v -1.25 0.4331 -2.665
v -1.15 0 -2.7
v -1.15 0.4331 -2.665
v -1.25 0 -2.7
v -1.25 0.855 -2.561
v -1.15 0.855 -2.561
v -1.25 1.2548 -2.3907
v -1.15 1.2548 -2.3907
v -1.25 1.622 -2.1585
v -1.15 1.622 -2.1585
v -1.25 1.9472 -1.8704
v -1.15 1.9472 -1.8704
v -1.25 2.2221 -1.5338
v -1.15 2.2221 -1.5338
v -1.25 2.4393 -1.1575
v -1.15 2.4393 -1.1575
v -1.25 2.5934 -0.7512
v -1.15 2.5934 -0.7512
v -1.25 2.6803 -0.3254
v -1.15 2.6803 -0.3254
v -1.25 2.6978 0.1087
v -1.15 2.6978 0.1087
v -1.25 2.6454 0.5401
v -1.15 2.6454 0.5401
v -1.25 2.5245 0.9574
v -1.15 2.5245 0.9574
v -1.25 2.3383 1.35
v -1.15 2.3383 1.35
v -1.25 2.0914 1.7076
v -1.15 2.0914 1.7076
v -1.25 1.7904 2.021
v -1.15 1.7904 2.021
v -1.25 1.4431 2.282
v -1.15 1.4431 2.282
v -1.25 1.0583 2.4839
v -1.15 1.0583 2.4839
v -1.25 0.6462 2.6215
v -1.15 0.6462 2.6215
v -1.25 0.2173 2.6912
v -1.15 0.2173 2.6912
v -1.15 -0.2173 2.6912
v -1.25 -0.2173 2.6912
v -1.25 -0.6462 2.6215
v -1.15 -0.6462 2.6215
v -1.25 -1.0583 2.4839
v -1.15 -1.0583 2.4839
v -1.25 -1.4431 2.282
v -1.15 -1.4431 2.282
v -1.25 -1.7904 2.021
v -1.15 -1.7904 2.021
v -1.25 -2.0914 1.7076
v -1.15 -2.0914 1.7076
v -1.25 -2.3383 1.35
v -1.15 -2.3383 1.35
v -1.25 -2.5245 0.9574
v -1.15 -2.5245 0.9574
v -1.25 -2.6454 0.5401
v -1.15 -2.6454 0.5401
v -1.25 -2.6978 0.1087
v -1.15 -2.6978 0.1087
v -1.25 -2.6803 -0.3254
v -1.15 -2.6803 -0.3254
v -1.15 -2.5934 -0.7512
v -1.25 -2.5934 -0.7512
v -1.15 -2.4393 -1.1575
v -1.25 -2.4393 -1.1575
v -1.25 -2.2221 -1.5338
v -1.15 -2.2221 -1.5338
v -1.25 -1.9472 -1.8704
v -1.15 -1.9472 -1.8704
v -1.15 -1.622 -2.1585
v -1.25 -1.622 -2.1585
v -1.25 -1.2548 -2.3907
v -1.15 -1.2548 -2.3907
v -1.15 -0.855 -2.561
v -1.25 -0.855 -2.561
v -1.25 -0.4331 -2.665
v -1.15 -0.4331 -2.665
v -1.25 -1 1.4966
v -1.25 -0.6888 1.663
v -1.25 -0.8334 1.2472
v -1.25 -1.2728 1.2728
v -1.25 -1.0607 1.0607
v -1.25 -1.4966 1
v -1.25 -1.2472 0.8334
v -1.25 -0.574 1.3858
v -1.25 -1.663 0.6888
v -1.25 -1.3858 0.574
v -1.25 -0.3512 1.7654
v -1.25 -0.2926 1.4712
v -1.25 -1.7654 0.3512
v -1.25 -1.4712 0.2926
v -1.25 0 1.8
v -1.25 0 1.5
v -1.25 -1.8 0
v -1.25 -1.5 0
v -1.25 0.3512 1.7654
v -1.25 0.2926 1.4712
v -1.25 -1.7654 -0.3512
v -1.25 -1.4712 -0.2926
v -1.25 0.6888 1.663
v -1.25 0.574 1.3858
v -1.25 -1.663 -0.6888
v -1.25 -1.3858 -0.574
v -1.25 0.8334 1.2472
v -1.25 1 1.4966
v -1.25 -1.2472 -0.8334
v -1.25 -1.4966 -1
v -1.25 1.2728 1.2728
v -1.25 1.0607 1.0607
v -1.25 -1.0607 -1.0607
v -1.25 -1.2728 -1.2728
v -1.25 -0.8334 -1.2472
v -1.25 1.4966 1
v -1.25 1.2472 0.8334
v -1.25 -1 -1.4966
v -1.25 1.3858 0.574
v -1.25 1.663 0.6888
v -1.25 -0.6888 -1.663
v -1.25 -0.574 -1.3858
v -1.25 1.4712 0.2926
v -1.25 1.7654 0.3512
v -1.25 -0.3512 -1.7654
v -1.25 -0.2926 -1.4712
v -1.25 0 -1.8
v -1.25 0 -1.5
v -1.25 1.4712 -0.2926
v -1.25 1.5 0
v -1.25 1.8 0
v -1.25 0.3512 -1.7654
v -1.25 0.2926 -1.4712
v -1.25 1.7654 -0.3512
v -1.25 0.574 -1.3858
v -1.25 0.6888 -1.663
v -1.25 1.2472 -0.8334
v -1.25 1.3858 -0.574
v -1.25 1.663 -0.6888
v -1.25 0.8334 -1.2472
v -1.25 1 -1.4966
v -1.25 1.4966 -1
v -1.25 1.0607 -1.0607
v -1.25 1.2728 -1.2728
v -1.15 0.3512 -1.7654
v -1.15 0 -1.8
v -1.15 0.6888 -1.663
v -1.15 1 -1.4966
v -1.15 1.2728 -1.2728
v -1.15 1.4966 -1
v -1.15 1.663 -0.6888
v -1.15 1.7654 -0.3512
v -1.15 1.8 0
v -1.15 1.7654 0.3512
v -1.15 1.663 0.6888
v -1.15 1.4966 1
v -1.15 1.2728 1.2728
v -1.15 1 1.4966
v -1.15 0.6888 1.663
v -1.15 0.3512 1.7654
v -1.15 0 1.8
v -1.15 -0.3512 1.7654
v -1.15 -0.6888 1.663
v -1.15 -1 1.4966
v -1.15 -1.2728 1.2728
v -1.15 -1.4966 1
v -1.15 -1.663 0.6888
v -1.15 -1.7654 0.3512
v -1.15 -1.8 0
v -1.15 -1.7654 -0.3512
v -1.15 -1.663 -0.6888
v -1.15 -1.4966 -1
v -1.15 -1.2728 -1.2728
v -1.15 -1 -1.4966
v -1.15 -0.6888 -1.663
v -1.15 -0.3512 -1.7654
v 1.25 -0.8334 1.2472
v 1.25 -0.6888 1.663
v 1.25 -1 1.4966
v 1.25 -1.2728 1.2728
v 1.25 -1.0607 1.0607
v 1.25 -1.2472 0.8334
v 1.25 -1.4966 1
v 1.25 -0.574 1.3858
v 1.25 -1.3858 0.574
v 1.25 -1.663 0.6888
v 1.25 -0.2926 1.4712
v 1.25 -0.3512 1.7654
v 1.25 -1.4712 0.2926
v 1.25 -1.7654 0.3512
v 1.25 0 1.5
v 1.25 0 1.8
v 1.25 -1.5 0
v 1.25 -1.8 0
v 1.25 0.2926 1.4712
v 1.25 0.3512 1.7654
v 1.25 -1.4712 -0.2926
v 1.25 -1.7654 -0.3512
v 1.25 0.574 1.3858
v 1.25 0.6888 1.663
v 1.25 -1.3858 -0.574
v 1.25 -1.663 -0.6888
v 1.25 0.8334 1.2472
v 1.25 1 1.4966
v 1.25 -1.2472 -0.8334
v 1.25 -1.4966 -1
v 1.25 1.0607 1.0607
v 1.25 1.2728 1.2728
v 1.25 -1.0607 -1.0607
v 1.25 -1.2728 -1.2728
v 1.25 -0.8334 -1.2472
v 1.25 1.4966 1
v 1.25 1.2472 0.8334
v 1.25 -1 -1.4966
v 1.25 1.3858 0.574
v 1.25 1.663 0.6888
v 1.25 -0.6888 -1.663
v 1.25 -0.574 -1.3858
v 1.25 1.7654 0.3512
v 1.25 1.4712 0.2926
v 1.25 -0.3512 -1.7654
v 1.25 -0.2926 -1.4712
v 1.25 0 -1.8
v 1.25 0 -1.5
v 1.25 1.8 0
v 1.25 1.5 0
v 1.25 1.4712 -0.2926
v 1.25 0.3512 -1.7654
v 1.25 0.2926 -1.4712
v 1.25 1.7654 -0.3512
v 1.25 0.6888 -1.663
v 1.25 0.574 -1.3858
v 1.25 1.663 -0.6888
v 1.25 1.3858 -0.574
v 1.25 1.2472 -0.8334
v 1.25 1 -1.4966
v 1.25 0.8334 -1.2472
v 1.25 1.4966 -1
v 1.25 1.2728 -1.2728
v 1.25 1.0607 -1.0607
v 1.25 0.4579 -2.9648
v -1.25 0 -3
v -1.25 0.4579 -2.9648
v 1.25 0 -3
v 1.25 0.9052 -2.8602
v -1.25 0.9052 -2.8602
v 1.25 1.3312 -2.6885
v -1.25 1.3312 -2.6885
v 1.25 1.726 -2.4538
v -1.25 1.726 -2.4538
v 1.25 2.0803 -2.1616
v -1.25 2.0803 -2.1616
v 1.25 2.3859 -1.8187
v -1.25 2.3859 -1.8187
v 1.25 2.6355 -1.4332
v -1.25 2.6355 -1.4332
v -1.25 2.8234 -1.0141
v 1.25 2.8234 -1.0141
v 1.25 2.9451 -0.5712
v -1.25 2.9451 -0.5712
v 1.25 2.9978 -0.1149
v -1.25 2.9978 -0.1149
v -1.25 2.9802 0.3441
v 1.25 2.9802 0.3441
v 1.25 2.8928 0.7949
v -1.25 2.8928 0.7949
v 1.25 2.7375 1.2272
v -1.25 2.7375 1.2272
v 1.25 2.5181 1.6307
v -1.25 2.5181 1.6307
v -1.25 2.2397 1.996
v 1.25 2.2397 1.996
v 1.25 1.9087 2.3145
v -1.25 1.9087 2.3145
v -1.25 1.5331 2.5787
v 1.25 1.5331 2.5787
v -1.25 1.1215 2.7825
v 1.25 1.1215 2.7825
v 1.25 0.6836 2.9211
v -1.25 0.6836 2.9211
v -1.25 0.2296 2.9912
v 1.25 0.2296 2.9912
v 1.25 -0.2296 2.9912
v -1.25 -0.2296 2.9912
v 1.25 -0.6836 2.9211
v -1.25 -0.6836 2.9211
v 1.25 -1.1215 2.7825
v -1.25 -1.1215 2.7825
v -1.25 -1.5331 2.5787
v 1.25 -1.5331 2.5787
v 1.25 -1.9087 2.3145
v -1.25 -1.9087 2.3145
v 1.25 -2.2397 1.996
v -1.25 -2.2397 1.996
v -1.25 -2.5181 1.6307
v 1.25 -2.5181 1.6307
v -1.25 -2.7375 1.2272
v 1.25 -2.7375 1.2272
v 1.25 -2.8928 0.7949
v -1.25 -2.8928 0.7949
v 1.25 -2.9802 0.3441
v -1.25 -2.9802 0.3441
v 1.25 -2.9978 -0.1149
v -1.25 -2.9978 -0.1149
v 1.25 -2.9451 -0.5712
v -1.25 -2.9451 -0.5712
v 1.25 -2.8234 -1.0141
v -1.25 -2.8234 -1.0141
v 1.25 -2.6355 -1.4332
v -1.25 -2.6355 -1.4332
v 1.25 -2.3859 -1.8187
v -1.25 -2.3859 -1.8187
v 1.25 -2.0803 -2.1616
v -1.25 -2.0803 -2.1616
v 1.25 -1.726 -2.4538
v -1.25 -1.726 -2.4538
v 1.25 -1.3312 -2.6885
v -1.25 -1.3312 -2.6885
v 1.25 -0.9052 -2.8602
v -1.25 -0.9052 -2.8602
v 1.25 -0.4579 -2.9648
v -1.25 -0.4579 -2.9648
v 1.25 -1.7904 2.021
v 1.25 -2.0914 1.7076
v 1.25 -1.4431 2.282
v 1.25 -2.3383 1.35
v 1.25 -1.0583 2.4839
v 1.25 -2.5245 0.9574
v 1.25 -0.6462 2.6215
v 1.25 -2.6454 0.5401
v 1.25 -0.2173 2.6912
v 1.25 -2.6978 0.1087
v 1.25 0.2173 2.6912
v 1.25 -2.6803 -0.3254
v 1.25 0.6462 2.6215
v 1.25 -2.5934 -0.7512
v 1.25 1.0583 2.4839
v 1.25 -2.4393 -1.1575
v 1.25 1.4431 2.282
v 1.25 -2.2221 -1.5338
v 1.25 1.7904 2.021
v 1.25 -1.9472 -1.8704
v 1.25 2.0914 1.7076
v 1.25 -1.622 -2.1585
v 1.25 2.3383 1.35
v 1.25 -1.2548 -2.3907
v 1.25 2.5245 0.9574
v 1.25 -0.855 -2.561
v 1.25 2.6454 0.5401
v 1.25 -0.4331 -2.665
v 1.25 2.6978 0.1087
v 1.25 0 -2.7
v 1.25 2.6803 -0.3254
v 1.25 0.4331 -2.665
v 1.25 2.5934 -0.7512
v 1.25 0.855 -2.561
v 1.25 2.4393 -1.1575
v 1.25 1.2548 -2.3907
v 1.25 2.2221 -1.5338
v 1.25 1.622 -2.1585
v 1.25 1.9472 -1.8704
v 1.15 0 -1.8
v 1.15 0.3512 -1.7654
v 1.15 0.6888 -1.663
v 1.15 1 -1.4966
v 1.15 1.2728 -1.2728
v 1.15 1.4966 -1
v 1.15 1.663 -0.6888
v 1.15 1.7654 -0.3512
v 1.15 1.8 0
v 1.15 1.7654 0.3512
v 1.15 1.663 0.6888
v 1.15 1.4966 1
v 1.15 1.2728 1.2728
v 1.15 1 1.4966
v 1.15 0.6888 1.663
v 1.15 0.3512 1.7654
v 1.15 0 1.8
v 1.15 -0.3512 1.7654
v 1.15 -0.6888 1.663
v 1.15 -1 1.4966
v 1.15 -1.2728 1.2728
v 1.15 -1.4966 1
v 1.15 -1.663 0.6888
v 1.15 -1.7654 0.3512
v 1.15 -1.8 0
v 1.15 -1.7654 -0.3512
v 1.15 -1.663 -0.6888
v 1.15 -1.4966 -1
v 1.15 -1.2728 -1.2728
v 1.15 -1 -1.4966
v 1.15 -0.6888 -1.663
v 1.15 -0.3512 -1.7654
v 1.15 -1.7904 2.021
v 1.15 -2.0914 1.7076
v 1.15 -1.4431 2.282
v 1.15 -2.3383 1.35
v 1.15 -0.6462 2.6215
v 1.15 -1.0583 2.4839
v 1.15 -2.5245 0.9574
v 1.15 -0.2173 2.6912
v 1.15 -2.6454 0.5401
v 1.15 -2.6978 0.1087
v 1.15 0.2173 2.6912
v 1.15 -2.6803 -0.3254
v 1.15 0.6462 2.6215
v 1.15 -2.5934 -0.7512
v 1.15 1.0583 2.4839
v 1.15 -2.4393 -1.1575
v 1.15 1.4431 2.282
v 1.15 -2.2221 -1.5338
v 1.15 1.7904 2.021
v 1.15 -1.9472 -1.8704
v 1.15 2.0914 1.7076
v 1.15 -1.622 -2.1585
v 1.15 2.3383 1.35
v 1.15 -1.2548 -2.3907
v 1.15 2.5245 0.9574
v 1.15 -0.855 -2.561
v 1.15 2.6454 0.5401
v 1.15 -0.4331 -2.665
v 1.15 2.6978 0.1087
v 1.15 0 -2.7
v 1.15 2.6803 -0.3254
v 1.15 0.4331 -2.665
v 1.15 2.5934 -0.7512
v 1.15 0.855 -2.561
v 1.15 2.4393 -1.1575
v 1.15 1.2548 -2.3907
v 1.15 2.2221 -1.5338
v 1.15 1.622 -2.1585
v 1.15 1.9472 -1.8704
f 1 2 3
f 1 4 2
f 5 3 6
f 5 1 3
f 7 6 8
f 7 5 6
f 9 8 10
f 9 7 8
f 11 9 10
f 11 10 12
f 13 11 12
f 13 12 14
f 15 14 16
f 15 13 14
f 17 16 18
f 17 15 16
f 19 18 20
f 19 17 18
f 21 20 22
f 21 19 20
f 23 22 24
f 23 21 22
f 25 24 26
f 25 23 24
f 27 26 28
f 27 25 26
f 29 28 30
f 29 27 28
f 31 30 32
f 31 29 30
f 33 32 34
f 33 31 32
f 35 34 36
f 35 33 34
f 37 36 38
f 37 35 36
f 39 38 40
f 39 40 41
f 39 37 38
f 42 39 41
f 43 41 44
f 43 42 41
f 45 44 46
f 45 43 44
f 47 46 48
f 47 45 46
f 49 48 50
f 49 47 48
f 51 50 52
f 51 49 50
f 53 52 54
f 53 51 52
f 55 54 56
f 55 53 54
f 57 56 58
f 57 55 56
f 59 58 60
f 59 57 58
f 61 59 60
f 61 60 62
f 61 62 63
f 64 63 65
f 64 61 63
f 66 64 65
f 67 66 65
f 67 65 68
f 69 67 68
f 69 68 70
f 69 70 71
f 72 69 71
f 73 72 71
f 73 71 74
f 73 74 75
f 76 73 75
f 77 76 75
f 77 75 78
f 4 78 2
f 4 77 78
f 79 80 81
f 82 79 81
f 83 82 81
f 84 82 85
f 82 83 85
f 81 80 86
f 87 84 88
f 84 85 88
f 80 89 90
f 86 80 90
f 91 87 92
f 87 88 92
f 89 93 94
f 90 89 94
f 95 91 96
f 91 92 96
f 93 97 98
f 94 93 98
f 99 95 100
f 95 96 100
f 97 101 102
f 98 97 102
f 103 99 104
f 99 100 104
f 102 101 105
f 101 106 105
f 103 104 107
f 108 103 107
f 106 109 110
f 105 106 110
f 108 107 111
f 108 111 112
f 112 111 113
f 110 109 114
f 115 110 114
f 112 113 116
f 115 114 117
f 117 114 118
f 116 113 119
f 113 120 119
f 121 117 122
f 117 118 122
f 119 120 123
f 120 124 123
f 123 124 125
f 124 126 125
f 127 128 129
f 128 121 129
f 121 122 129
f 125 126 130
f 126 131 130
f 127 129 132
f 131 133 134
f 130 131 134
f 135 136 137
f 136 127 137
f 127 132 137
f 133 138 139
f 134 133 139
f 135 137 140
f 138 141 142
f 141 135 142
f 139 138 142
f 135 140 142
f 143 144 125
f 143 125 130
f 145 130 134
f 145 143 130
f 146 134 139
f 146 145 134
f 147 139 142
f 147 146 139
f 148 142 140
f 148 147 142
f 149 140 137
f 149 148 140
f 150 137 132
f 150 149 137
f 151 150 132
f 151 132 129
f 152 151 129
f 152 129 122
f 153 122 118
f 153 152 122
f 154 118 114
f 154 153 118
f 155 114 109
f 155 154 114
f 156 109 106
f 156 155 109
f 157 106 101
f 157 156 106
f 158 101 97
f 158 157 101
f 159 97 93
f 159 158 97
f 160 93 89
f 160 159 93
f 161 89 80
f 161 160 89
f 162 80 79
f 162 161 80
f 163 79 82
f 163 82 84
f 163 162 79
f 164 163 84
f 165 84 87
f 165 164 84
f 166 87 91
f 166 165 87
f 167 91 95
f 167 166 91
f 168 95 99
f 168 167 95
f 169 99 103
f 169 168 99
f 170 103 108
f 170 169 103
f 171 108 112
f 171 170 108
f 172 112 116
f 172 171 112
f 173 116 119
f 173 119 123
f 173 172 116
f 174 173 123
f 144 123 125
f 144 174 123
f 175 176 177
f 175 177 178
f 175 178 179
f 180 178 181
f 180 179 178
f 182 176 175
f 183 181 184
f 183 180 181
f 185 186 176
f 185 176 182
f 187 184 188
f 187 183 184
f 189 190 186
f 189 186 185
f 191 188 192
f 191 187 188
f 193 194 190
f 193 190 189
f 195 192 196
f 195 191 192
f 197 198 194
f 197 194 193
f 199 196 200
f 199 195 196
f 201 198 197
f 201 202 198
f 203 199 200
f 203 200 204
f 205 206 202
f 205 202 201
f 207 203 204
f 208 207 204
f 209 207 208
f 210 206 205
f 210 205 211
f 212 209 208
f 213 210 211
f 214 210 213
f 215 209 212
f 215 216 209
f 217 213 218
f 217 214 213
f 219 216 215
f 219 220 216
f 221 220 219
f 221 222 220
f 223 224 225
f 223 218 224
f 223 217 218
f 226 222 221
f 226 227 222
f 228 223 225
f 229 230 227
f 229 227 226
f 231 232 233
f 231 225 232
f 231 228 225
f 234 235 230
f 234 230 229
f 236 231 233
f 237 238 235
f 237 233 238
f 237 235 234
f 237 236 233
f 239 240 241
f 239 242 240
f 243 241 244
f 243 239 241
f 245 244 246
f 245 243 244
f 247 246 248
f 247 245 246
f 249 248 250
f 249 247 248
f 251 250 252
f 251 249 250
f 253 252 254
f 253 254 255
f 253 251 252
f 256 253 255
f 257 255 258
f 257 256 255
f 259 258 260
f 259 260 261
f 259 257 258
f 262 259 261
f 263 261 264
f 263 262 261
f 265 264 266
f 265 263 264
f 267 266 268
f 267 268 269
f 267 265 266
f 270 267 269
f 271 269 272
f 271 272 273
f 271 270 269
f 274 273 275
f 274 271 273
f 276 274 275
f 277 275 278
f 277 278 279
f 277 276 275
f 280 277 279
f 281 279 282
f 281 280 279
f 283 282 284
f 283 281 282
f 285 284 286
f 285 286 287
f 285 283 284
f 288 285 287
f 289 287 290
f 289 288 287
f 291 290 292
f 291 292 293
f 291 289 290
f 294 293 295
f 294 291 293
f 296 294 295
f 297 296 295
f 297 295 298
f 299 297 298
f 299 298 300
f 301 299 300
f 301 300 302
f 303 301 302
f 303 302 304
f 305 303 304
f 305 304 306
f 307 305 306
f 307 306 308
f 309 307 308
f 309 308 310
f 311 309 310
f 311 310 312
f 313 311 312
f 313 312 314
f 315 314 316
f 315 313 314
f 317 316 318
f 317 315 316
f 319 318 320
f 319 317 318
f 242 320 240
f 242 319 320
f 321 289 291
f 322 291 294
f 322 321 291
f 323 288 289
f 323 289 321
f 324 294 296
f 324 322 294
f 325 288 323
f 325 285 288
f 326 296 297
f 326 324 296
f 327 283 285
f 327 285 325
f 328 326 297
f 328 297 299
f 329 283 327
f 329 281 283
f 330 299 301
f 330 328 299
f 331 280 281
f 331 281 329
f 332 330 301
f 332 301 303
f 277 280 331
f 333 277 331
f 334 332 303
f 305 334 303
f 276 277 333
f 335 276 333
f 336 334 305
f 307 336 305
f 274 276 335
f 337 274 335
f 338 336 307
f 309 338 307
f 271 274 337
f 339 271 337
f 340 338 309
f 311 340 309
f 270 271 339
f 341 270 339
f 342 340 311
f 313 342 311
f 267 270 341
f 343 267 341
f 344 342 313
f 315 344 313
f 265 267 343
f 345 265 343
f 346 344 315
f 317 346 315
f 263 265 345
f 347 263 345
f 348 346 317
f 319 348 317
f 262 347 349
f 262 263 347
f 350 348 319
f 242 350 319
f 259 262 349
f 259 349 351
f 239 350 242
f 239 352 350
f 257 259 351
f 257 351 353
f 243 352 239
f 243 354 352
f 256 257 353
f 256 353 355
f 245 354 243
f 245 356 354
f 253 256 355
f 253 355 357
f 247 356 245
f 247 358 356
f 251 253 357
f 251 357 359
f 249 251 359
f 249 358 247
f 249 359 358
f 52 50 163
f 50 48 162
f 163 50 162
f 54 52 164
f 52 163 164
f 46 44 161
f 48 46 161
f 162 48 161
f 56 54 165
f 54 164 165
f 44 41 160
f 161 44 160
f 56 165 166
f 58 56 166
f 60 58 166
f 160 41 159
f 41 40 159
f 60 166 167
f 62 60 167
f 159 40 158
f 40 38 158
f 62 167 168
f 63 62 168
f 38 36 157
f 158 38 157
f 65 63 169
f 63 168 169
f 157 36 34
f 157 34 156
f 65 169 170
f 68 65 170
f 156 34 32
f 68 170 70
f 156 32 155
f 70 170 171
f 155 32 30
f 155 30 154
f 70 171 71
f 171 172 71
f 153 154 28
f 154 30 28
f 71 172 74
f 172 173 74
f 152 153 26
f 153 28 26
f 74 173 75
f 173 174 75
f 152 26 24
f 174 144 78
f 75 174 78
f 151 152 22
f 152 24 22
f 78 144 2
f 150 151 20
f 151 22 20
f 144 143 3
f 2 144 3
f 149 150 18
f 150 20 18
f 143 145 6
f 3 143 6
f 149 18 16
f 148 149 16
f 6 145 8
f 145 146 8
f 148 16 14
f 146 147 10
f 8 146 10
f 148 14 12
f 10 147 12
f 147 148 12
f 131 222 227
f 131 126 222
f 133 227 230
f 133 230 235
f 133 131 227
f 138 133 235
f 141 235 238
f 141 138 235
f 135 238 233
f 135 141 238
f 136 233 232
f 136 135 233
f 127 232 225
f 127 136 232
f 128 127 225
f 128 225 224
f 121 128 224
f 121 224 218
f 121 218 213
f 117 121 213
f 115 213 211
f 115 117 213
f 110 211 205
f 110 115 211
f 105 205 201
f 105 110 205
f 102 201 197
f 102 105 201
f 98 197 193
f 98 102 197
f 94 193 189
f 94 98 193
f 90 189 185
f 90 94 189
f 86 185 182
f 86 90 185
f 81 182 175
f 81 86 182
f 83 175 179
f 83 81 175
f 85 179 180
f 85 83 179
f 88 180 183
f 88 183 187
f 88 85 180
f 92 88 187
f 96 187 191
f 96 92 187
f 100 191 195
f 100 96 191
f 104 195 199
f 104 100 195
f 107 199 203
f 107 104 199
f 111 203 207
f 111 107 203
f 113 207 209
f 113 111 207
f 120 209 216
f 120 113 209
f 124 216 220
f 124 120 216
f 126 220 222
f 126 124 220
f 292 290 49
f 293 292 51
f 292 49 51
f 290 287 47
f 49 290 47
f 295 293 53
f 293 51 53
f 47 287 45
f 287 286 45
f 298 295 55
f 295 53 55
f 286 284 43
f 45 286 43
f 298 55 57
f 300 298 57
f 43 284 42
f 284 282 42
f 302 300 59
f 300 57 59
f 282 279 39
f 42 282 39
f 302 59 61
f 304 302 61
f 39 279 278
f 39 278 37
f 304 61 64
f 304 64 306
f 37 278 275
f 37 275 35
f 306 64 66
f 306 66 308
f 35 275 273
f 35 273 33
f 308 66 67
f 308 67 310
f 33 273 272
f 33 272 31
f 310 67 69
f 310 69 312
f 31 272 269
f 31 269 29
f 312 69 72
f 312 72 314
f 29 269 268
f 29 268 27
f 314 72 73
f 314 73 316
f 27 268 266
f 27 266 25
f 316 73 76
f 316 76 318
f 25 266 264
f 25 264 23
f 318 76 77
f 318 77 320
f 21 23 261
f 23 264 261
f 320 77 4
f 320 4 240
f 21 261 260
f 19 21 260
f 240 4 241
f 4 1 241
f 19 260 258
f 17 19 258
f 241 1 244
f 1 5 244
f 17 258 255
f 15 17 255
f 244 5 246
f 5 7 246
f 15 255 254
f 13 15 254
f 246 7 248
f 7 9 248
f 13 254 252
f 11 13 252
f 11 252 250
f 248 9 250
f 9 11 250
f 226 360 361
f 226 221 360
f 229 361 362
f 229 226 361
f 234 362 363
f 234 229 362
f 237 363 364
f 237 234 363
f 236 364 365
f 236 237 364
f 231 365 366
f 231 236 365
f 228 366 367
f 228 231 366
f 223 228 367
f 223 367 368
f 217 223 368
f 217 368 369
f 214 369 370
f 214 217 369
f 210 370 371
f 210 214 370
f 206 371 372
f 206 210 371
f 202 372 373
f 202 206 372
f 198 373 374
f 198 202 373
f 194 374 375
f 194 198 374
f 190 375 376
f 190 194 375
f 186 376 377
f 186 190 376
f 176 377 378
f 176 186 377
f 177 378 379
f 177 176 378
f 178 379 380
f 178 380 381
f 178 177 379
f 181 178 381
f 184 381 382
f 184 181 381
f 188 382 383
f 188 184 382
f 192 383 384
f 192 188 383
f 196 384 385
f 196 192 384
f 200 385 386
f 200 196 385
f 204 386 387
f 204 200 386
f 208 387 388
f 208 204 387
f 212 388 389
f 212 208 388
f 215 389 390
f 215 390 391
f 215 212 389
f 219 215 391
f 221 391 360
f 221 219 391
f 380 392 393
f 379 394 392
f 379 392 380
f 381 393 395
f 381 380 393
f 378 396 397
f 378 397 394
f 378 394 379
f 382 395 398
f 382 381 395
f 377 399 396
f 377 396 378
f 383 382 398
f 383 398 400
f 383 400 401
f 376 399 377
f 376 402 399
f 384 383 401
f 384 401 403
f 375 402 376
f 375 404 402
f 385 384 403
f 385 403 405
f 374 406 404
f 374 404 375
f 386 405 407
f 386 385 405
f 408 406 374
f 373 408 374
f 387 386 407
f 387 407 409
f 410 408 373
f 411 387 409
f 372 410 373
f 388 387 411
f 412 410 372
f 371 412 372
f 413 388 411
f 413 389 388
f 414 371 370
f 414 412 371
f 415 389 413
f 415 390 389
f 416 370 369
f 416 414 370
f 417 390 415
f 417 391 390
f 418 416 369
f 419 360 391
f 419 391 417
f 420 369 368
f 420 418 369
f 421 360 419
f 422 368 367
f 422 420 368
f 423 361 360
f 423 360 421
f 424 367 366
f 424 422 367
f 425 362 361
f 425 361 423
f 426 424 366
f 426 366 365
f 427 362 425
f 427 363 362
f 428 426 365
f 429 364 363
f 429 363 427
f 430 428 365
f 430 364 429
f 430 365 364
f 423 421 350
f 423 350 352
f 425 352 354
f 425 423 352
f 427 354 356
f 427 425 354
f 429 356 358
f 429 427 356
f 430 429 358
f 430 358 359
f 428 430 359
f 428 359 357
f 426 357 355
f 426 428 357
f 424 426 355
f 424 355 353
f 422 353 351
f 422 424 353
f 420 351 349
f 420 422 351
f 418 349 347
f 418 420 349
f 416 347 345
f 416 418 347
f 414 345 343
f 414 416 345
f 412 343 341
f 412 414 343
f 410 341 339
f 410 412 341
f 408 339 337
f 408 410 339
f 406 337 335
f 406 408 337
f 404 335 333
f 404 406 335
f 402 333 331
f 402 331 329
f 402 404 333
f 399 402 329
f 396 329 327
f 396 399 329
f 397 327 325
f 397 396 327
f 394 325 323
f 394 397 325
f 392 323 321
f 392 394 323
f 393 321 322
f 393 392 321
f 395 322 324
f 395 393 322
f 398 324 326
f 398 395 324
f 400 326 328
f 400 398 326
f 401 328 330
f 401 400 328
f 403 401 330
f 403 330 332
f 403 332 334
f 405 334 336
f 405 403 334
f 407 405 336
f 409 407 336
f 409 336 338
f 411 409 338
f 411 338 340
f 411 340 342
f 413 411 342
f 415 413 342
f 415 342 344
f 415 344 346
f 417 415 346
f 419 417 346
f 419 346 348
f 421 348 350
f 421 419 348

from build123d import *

# Parameters (mm, degrees)
ESQUISSE1_R          = 3
ESQUISSE1_R_2        = 2.7
BOSS_EXTRU_1_DEPTH   = 1.25
ESQUISSE1_R_3        = 1.8
ESQUISSE1_R_4        = 1.5
BOSS_EXTRU_1_2_DEPTH = 1.25
ESQUISSE2_R          = 2.7
ESQUISSE2_R_2        = 1.8
BOSS_EXTRU_2_DEPTH   = 1.15


with BuildPart() as part:
    # Esquisse1 → Boss.-Extru.1 (new, symmetric)
    with BuildSketch(Plane(origin=(0, 0, 0), x_dir=(0, 0, -1), z_dir=(1, 0, 0))):
        Circle(ESQUISSE1_R)
        Circle(ESQUISSE1_R_2, mode=Mode.SUBTRACT)
    extrude(amount=BOSS_EXTRU_1_DEPTH, both=True)



with BuildPart() as body_2:
    # Esquisse1 → Boss.-Extru.1 2 (new, symmetric)
    with BuildSketch(Plane(origin=(0, 0, 0), x_dir=(0, 0, -1), z_dir=(1, 0, 0))):
        Circle(ESQUISSE1_R_3)
        Circle(ESQUISSE1_R_4, mode=Mode.SUBTRACT)
    extrude(amount=BOSS_EXTRU_1_2_DEPTH, both=True)


with BuildPart() as part_1:
    add(part.part)

    add(body_2.part)  # Boss.-Extru.2 merges body 2
    # Esquisse2 → Boss.-Extru.2 (add, symmetric)
    with BuildSketch(Plane(origin=(0, 0, 0), x_dir=(0, 0, -1), z_dir=(1, 0, 0))):
        Circle(ESQUISSE2_R)
        Circle(ESQUISSE2_R_2, mode=Mode.SUBTRACT)
    extrude(amount=BOSS_EXTRU_2_DEPTH, both=True)


solid = part_1.part
